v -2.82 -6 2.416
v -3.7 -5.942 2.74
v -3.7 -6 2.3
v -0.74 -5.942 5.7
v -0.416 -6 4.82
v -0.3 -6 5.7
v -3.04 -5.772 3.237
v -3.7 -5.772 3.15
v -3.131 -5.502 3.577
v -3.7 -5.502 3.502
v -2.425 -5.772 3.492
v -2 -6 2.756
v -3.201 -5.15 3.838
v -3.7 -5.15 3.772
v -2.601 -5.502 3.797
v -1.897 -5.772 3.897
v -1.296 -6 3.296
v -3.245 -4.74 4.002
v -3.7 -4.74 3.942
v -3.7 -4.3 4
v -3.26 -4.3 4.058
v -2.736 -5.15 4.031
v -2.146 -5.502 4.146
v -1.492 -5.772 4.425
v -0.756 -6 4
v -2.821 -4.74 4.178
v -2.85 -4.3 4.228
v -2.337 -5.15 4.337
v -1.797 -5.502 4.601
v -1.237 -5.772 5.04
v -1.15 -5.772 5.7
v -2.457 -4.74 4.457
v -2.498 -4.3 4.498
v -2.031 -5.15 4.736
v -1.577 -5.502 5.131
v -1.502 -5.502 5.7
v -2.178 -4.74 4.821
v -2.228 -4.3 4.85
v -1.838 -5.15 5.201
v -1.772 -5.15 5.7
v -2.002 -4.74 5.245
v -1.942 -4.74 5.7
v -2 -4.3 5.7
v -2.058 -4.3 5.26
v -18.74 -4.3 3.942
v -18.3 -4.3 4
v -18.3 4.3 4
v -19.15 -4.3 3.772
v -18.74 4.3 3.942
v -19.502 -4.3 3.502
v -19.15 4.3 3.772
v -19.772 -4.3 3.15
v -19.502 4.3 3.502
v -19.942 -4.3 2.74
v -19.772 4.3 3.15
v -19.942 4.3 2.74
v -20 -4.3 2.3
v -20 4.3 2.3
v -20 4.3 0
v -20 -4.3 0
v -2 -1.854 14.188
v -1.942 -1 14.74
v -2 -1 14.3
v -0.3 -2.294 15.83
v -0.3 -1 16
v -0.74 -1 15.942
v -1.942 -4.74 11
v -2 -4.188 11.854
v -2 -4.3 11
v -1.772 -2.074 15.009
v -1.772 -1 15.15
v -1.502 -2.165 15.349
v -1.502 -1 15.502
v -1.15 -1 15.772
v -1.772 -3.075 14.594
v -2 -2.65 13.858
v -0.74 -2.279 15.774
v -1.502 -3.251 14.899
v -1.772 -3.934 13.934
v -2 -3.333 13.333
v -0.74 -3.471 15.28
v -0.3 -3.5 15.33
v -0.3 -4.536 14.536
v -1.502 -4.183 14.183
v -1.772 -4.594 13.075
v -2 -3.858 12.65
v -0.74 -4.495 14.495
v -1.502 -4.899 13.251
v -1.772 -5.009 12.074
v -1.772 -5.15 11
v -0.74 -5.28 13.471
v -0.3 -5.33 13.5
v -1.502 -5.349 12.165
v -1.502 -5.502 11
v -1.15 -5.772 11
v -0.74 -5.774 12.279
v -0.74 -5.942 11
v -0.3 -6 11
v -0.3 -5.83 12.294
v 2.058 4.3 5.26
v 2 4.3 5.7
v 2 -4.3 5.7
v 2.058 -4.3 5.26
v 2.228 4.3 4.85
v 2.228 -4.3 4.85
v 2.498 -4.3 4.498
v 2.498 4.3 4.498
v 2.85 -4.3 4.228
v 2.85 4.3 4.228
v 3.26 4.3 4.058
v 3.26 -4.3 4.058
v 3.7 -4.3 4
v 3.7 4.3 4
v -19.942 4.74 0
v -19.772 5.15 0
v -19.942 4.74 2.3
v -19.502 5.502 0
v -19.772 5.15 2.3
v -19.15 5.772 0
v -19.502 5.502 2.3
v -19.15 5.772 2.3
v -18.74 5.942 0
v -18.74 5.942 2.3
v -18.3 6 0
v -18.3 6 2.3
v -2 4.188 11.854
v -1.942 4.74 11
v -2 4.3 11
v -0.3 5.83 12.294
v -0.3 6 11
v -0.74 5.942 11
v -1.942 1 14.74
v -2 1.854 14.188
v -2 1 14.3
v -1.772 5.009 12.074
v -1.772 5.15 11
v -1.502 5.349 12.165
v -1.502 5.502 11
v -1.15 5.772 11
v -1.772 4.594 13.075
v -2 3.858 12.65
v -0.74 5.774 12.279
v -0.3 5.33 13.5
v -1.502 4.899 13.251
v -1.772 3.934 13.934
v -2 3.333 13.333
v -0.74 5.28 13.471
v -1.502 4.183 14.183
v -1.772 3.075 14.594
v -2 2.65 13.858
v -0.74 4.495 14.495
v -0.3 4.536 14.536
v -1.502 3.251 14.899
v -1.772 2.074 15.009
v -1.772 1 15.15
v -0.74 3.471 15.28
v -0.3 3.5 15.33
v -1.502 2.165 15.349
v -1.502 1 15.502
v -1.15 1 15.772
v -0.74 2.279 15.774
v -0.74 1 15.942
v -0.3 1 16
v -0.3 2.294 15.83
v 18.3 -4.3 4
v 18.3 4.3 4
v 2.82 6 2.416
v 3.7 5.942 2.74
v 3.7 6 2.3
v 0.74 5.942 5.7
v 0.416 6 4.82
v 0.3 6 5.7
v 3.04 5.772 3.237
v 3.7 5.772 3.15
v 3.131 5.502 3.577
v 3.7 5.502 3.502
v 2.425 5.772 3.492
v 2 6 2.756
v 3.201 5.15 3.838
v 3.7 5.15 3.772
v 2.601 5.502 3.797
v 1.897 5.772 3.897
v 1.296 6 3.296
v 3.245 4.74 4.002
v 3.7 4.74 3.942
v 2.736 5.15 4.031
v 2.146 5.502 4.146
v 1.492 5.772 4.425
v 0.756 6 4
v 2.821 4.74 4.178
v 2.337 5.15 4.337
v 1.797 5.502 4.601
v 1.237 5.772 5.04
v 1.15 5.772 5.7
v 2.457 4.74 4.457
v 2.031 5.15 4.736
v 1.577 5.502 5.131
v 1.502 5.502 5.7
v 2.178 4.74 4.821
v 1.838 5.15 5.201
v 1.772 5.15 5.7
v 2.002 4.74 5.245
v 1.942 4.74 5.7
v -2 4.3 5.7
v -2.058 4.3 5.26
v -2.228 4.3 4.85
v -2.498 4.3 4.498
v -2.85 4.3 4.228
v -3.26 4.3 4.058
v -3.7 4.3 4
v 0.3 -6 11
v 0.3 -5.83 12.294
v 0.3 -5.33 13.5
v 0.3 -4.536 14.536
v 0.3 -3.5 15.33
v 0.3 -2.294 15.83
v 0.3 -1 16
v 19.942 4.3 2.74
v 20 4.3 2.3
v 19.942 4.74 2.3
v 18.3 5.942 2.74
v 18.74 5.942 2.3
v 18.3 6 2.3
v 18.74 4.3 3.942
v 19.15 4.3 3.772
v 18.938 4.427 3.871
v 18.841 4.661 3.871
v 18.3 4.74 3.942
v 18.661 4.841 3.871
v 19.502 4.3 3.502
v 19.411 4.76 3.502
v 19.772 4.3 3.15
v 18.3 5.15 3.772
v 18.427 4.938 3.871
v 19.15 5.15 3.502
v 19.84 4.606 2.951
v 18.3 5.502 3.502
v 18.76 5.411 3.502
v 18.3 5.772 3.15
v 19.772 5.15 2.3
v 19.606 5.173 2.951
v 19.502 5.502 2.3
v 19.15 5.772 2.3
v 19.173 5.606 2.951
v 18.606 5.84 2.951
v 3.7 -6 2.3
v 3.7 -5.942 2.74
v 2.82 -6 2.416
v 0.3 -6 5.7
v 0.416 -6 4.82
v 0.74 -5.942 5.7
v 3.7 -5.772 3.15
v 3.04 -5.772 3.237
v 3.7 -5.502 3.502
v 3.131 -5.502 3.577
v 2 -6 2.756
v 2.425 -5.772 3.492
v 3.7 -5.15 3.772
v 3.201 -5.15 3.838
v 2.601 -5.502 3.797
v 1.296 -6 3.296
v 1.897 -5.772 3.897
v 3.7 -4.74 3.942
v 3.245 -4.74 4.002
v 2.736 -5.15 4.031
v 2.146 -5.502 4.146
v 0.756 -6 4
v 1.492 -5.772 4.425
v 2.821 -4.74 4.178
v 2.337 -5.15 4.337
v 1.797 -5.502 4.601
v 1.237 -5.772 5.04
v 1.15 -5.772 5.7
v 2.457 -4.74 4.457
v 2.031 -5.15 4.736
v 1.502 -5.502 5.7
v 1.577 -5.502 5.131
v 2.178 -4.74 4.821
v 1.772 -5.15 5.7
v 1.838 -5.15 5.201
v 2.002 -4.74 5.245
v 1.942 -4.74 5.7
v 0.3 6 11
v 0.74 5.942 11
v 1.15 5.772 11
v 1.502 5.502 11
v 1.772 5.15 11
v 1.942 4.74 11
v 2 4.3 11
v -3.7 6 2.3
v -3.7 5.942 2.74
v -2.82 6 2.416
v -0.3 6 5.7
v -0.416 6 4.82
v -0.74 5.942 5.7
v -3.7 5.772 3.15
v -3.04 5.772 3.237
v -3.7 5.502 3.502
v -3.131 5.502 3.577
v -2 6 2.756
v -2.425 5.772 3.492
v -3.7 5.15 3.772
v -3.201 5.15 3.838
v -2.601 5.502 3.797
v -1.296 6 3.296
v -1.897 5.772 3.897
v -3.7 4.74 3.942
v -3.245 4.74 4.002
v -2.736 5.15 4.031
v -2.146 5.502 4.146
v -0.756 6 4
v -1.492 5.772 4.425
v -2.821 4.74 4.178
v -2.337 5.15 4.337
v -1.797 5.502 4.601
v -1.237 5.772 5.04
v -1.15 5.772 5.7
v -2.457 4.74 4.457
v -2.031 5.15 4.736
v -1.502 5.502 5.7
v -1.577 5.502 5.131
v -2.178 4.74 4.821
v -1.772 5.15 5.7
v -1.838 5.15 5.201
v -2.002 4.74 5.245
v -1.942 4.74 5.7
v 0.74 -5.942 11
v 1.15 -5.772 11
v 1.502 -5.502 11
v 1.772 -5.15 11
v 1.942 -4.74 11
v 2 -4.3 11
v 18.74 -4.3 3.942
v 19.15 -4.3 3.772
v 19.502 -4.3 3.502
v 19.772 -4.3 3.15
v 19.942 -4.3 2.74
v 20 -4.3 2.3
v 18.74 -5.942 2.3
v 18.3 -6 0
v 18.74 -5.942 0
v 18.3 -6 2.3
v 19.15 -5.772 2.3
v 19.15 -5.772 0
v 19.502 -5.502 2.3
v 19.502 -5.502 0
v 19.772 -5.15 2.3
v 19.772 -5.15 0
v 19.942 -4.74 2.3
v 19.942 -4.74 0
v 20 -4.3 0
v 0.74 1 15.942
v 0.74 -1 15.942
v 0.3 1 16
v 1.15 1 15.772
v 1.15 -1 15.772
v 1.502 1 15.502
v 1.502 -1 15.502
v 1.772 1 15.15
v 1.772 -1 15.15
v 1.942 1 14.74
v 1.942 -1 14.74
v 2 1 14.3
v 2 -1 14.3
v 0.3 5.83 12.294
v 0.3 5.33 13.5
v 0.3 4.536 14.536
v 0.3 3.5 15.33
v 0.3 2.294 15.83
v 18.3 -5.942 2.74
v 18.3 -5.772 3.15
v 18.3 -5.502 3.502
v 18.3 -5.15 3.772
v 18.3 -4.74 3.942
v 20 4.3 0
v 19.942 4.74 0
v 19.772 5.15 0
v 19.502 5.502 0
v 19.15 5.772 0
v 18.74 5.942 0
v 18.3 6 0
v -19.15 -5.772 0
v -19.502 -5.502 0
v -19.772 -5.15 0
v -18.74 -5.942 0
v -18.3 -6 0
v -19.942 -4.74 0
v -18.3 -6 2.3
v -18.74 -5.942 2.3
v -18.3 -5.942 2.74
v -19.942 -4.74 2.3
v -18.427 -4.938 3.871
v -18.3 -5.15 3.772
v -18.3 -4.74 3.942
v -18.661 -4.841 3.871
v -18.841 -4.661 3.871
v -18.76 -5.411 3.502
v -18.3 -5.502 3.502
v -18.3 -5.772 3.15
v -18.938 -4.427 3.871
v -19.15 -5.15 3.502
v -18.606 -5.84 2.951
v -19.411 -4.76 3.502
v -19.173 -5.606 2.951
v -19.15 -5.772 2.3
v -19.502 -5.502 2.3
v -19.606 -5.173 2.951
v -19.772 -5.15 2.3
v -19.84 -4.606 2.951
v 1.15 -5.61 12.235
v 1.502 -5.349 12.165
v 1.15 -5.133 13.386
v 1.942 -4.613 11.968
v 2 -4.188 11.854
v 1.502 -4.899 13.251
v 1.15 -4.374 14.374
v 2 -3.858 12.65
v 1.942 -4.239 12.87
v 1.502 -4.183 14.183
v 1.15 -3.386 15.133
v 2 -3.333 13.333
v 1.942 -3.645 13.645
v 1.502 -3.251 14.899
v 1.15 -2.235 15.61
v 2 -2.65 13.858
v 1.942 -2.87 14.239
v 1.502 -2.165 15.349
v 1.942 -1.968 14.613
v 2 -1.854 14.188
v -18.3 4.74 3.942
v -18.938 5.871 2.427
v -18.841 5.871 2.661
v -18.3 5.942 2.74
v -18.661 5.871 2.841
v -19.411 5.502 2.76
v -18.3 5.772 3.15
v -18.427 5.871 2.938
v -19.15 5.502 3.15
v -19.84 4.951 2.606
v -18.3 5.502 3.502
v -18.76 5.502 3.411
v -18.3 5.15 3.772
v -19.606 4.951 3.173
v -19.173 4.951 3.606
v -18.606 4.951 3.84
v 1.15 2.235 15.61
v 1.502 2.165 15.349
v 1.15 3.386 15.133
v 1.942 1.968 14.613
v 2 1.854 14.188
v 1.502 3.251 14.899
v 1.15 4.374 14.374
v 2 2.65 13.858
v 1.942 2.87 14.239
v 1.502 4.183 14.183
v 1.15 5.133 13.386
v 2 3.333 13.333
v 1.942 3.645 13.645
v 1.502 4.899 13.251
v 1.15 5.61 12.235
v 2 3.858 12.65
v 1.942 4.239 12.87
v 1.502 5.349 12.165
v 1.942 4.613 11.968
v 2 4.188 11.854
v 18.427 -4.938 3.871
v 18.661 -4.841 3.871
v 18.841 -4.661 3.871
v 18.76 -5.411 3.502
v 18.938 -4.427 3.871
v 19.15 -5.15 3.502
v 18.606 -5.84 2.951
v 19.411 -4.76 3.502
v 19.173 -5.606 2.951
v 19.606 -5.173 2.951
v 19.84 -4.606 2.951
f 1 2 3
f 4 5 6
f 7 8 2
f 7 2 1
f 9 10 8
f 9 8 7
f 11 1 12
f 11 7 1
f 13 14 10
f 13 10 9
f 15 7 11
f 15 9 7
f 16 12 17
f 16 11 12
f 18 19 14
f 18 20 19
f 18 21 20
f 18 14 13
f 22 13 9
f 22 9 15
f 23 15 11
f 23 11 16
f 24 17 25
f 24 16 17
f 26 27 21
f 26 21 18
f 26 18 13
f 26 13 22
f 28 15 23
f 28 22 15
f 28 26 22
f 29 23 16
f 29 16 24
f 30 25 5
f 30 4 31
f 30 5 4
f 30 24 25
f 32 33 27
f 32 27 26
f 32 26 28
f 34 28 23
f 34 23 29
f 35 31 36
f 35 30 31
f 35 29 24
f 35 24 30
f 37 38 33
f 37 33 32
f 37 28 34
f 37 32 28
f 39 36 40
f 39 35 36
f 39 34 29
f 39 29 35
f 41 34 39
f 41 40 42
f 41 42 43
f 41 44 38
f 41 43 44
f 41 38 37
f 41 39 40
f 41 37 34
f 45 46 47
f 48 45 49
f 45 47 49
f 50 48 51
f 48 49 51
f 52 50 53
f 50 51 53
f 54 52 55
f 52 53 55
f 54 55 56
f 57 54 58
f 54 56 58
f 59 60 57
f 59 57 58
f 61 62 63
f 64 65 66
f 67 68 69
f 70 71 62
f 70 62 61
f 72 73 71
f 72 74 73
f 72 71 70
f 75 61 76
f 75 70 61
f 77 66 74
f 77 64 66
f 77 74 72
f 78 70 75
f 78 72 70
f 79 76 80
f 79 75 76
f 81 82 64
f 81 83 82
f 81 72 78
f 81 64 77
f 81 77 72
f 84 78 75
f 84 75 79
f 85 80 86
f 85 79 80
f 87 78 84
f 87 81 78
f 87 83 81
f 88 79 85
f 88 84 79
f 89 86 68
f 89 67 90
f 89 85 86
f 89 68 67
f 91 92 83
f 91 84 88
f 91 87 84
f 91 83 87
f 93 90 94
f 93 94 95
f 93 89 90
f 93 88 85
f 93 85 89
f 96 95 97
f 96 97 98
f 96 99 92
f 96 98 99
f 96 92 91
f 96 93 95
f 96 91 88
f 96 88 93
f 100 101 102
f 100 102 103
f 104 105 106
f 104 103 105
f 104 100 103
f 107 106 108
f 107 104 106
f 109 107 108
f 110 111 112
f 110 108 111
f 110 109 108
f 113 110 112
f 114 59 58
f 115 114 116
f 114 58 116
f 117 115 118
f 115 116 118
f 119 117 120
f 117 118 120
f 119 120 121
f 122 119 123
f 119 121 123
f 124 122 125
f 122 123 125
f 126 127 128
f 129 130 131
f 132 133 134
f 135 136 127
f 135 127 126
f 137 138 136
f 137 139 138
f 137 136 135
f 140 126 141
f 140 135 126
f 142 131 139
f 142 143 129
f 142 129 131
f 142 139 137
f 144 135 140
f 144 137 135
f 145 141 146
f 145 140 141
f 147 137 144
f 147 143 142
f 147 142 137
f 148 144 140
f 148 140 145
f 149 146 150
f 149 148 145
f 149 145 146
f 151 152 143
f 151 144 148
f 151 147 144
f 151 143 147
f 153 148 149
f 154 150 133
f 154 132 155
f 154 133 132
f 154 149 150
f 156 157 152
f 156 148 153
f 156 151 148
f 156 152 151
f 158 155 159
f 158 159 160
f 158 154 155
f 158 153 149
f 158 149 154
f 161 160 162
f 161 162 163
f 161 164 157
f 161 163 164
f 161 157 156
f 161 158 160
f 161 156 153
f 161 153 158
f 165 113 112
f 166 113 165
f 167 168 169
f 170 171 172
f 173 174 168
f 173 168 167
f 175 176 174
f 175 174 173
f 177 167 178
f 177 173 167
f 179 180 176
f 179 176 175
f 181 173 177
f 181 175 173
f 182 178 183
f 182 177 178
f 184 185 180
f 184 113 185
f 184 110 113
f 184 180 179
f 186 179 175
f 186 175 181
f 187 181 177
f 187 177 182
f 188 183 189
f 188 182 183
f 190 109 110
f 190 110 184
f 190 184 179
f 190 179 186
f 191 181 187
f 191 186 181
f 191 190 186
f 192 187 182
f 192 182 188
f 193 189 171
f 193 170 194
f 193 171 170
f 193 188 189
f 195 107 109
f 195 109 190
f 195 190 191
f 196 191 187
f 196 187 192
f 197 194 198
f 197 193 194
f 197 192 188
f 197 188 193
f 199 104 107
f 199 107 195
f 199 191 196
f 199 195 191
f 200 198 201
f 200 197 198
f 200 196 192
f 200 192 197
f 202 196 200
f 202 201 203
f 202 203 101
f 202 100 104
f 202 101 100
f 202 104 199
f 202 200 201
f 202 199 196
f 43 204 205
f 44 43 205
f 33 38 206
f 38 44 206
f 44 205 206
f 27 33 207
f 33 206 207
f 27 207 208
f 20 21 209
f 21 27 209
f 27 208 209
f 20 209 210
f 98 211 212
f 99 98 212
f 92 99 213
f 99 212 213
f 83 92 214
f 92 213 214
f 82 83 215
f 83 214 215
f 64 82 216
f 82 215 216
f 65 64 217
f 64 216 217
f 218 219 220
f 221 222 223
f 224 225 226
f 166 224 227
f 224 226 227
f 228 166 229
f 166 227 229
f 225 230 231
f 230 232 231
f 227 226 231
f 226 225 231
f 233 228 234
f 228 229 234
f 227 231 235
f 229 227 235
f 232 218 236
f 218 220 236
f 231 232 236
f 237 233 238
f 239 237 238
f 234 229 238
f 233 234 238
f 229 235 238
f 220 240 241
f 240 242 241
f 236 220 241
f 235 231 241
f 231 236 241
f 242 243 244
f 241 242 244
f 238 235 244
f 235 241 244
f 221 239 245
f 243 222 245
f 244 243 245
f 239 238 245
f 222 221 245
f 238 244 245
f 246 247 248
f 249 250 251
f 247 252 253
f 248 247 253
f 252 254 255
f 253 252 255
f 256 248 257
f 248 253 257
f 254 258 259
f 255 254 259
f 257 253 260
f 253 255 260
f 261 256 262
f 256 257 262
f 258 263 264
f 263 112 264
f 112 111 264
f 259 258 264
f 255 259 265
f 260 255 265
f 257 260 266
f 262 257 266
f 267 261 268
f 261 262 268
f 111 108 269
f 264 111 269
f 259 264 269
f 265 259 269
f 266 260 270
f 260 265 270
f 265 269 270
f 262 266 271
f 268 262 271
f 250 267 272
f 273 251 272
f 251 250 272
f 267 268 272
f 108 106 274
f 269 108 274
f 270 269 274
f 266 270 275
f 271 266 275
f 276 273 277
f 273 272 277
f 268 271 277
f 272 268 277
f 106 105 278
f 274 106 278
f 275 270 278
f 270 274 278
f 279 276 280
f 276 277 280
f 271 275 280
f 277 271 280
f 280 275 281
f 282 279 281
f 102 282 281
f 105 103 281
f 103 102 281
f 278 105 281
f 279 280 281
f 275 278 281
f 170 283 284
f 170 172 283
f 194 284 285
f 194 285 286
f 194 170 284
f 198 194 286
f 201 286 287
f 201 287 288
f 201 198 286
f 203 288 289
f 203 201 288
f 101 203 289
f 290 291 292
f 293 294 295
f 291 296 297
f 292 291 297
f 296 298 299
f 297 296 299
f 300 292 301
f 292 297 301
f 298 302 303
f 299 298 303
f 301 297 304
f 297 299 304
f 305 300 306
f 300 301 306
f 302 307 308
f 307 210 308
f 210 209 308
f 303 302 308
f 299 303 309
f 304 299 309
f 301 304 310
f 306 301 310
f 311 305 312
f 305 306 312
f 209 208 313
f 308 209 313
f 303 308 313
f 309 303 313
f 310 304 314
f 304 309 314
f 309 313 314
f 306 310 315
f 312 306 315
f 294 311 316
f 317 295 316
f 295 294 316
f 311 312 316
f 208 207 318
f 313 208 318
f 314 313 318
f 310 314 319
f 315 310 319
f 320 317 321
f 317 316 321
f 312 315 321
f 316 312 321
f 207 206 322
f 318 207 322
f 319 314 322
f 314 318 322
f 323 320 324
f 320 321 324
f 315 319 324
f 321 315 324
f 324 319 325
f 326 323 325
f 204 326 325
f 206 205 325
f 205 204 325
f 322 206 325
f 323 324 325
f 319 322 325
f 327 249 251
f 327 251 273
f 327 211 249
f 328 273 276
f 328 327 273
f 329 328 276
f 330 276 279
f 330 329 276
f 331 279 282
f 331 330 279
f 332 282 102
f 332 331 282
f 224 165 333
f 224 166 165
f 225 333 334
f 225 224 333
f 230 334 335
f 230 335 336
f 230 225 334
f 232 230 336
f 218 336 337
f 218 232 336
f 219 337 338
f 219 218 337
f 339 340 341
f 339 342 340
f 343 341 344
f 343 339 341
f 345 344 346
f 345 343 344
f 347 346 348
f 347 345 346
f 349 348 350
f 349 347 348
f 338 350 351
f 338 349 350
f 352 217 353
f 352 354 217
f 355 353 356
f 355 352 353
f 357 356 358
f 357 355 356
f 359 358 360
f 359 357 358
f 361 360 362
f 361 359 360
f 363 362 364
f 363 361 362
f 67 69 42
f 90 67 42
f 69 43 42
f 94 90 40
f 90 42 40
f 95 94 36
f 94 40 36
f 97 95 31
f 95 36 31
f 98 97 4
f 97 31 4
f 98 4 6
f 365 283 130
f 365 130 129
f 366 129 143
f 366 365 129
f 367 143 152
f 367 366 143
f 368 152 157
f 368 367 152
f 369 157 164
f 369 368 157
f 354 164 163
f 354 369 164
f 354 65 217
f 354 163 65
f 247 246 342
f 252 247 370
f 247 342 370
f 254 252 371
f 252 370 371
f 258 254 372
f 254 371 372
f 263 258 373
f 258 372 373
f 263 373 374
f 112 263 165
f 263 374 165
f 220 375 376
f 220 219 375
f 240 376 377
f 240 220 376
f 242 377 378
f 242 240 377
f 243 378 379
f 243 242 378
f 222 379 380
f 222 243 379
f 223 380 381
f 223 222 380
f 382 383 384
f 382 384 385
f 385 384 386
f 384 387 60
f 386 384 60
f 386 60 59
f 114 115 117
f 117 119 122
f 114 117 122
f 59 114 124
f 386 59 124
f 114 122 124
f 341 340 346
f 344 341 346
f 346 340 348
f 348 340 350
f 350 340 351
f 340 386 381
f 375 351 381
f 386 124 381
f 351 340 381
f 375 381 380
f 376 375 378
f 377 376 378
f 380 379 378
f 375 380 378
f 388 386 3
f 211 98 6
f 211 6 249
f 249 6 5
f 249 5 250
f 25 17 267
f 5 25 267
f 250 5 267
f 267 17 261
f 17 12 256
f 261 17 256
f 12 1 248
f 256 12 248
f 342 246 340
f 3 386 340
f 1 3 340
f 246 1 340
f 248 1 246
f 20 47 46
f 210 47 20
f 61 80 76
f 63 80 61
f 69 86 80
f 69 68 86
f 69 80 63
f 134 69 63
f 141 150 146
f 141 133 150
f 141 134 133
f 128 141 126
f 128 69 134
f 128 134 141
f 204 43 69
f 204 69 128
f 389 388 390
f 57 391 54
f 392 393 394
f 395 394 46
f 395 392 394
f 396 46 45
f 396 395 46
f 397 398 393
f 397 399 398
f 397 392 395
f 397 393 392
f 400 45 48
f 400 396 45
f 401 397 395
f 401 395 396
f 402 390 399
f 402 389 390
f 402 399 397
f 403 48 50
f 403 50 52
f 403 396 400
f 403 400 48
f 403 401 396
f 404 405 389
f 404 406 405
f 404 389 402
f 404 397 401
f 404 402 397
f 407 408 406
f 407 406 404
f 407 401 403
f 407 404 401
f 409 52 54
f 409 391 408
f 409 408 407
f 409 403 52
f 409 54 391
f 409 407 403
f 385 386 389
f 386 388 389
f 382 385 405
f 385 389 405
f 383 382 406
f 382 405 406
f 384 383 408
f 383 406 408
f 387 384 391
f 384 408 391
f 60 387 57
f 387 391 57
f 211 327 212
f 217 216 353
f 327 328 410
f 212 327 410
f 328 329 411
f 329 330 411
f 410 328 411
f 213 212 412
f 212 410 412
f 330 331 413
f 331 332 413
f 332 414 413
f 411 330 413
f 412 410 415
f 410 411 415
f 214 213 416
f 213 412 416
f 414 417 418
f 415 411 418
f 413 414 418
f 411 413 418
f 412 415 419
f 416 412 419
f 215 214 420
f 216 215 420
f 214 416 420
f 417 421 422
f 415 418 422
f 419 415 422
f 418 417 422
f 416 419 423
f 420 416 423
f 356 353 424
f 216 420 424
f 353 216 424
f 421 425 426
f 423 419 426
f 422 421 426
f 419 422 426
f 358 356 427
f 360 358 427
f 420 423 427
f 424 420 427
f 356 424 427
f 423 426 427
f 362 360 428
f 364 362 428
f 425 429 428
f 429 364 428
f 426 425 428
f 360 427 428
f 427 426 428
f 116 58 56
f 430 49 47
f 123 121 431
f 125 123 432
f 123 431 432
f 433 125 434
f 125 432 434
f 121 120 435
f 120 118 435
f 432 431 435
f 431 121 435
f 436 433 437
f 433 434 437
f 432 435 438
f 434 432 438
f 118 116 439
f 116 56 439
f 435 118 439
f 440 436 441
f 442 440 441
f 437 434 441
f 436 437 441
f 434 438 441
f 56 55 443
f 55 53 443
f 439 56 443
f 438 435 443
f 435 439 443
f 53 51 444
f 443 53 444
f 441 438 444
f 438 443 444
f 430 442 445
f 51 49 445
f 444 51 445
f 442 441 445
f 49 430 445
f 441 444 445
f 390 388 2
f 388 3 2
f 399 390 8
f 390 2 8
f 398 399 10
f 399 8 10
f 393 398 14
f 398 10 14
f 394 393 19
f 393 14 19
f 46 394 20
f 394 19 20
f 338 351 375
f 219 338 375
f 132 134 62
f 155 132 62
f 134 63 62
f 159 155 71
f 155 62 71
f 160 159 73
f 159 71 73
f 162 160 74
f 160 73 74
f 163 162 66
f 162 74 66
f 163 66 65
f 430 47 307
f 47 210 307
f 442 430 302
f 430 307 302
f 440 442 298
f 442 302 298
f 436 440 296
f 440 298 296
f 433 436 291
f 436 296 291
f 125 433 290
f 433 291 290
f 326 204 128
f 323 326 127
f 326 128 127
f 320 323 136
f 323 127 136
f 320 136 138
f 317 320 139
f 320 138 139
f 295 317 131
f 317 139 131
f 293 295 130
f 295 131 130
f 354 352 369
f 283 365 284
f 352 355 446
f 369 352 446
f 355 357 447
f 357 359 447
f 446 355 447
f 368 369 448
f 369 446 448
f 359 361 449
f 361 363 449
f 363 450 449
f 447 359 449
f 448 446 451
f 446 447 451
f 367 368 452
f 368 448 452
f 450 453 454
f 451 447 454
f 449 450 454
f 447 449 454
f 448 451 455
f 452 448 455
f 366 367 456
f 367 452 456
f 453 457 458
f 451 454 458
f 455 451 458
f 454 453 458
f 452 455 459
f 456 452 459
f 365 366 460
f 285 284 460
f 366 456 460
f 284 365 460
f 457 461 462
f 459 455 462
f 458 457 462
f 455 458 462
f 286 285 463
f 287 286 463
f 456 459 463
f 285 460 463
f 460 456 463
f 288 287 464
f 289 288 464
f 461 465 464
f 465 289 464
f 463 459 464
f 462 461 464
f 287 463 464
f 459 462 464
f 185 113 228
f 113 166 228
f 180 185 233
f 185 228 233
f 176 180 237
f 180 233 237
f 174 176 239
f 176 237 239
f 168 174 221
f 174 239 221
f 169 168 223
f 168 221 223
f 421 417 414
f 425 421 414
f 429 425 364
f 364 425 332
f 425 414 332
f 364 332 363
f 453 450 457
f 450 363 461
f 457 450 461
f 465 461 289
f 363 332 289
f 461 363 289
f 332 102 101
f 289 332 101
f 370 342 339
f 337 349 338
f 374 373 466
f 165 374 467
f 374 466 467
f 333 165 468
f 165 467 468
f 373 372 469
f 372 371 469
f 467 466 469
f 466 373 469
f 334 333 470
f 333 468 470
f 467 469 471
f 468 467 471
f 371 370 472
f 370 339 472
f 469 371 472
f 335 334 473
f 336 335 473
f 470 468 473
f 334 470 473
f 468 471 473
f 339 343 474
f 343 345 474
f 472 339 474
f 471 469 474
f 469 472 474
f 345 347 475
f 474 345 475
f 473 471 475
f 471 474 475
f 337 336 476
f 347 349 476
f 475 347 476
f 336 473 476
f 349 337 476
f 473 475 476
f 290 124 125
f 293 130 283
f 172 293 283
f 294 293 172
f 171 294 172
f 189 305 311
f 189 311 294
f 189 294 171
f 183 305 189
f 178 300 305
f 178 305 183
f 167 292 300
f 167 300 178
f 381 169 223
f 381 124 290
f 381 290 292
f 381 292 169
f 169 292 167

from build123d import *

# Parameters (mm, degrees)
F0_W     = 40
F0_H     = 12
F1_DEPTH = 4
F2_W     = 4
F2_H     = 12
F3_DEPTH = 12
F4_R     = 5
F5_R     = 1.7


with BuildPart() as f1:
    # F0 (on Top) → F1 (new body)
    with BuildSketch(Plane.XY):
        Rectangle(F0_W, F0_H)
    extrude(amount=F1_DEPTH)

    # F2 (on face) → F3 (join)
    with BuildSketch(Plane.XY.offset(4)):
        Rectangle(F2_W, F2_H)
    extrude(amount=F3_DEPTH)

    # F4
    f4_edges = [f1.edges().sort_by_distance(p)[0] for p in [
        (0, -6, 16),
        (0, 6, 16),
    ]]
    fillet(f4_edges, radius=F4_R)

    # F5
    f5_edges = [f1.edges().sort_by_distance(p)[0] for p in [
        (-20, -6, 2),
        (-11, -6, 4),
        (-20, 0, 4),
        (-20, 6, 2),
        (-11, 6, 4),
        (20, -6, 2),
        (20, 6, 2),
        (11, -6, 4),
        (20, 0, 4),
        (11, 6, 4),
        (-2, 6, 7.5),
        (-2, 4.535534, 14.535534),
        (-2, 0, 4),
        (-2, 0, 16),
        (-2, -6, 7.5),
        (-2, -4.535534, 14.535534),
        (2, -6, 7.5),
        (2, 6, 7.5),
        (2, 4.535534, 14.535534),
        (2, 0, 16),
        (2, 0, 4),
    ]]
    fillet(f5_edges, radius=F5_R)


solid = f1.part
